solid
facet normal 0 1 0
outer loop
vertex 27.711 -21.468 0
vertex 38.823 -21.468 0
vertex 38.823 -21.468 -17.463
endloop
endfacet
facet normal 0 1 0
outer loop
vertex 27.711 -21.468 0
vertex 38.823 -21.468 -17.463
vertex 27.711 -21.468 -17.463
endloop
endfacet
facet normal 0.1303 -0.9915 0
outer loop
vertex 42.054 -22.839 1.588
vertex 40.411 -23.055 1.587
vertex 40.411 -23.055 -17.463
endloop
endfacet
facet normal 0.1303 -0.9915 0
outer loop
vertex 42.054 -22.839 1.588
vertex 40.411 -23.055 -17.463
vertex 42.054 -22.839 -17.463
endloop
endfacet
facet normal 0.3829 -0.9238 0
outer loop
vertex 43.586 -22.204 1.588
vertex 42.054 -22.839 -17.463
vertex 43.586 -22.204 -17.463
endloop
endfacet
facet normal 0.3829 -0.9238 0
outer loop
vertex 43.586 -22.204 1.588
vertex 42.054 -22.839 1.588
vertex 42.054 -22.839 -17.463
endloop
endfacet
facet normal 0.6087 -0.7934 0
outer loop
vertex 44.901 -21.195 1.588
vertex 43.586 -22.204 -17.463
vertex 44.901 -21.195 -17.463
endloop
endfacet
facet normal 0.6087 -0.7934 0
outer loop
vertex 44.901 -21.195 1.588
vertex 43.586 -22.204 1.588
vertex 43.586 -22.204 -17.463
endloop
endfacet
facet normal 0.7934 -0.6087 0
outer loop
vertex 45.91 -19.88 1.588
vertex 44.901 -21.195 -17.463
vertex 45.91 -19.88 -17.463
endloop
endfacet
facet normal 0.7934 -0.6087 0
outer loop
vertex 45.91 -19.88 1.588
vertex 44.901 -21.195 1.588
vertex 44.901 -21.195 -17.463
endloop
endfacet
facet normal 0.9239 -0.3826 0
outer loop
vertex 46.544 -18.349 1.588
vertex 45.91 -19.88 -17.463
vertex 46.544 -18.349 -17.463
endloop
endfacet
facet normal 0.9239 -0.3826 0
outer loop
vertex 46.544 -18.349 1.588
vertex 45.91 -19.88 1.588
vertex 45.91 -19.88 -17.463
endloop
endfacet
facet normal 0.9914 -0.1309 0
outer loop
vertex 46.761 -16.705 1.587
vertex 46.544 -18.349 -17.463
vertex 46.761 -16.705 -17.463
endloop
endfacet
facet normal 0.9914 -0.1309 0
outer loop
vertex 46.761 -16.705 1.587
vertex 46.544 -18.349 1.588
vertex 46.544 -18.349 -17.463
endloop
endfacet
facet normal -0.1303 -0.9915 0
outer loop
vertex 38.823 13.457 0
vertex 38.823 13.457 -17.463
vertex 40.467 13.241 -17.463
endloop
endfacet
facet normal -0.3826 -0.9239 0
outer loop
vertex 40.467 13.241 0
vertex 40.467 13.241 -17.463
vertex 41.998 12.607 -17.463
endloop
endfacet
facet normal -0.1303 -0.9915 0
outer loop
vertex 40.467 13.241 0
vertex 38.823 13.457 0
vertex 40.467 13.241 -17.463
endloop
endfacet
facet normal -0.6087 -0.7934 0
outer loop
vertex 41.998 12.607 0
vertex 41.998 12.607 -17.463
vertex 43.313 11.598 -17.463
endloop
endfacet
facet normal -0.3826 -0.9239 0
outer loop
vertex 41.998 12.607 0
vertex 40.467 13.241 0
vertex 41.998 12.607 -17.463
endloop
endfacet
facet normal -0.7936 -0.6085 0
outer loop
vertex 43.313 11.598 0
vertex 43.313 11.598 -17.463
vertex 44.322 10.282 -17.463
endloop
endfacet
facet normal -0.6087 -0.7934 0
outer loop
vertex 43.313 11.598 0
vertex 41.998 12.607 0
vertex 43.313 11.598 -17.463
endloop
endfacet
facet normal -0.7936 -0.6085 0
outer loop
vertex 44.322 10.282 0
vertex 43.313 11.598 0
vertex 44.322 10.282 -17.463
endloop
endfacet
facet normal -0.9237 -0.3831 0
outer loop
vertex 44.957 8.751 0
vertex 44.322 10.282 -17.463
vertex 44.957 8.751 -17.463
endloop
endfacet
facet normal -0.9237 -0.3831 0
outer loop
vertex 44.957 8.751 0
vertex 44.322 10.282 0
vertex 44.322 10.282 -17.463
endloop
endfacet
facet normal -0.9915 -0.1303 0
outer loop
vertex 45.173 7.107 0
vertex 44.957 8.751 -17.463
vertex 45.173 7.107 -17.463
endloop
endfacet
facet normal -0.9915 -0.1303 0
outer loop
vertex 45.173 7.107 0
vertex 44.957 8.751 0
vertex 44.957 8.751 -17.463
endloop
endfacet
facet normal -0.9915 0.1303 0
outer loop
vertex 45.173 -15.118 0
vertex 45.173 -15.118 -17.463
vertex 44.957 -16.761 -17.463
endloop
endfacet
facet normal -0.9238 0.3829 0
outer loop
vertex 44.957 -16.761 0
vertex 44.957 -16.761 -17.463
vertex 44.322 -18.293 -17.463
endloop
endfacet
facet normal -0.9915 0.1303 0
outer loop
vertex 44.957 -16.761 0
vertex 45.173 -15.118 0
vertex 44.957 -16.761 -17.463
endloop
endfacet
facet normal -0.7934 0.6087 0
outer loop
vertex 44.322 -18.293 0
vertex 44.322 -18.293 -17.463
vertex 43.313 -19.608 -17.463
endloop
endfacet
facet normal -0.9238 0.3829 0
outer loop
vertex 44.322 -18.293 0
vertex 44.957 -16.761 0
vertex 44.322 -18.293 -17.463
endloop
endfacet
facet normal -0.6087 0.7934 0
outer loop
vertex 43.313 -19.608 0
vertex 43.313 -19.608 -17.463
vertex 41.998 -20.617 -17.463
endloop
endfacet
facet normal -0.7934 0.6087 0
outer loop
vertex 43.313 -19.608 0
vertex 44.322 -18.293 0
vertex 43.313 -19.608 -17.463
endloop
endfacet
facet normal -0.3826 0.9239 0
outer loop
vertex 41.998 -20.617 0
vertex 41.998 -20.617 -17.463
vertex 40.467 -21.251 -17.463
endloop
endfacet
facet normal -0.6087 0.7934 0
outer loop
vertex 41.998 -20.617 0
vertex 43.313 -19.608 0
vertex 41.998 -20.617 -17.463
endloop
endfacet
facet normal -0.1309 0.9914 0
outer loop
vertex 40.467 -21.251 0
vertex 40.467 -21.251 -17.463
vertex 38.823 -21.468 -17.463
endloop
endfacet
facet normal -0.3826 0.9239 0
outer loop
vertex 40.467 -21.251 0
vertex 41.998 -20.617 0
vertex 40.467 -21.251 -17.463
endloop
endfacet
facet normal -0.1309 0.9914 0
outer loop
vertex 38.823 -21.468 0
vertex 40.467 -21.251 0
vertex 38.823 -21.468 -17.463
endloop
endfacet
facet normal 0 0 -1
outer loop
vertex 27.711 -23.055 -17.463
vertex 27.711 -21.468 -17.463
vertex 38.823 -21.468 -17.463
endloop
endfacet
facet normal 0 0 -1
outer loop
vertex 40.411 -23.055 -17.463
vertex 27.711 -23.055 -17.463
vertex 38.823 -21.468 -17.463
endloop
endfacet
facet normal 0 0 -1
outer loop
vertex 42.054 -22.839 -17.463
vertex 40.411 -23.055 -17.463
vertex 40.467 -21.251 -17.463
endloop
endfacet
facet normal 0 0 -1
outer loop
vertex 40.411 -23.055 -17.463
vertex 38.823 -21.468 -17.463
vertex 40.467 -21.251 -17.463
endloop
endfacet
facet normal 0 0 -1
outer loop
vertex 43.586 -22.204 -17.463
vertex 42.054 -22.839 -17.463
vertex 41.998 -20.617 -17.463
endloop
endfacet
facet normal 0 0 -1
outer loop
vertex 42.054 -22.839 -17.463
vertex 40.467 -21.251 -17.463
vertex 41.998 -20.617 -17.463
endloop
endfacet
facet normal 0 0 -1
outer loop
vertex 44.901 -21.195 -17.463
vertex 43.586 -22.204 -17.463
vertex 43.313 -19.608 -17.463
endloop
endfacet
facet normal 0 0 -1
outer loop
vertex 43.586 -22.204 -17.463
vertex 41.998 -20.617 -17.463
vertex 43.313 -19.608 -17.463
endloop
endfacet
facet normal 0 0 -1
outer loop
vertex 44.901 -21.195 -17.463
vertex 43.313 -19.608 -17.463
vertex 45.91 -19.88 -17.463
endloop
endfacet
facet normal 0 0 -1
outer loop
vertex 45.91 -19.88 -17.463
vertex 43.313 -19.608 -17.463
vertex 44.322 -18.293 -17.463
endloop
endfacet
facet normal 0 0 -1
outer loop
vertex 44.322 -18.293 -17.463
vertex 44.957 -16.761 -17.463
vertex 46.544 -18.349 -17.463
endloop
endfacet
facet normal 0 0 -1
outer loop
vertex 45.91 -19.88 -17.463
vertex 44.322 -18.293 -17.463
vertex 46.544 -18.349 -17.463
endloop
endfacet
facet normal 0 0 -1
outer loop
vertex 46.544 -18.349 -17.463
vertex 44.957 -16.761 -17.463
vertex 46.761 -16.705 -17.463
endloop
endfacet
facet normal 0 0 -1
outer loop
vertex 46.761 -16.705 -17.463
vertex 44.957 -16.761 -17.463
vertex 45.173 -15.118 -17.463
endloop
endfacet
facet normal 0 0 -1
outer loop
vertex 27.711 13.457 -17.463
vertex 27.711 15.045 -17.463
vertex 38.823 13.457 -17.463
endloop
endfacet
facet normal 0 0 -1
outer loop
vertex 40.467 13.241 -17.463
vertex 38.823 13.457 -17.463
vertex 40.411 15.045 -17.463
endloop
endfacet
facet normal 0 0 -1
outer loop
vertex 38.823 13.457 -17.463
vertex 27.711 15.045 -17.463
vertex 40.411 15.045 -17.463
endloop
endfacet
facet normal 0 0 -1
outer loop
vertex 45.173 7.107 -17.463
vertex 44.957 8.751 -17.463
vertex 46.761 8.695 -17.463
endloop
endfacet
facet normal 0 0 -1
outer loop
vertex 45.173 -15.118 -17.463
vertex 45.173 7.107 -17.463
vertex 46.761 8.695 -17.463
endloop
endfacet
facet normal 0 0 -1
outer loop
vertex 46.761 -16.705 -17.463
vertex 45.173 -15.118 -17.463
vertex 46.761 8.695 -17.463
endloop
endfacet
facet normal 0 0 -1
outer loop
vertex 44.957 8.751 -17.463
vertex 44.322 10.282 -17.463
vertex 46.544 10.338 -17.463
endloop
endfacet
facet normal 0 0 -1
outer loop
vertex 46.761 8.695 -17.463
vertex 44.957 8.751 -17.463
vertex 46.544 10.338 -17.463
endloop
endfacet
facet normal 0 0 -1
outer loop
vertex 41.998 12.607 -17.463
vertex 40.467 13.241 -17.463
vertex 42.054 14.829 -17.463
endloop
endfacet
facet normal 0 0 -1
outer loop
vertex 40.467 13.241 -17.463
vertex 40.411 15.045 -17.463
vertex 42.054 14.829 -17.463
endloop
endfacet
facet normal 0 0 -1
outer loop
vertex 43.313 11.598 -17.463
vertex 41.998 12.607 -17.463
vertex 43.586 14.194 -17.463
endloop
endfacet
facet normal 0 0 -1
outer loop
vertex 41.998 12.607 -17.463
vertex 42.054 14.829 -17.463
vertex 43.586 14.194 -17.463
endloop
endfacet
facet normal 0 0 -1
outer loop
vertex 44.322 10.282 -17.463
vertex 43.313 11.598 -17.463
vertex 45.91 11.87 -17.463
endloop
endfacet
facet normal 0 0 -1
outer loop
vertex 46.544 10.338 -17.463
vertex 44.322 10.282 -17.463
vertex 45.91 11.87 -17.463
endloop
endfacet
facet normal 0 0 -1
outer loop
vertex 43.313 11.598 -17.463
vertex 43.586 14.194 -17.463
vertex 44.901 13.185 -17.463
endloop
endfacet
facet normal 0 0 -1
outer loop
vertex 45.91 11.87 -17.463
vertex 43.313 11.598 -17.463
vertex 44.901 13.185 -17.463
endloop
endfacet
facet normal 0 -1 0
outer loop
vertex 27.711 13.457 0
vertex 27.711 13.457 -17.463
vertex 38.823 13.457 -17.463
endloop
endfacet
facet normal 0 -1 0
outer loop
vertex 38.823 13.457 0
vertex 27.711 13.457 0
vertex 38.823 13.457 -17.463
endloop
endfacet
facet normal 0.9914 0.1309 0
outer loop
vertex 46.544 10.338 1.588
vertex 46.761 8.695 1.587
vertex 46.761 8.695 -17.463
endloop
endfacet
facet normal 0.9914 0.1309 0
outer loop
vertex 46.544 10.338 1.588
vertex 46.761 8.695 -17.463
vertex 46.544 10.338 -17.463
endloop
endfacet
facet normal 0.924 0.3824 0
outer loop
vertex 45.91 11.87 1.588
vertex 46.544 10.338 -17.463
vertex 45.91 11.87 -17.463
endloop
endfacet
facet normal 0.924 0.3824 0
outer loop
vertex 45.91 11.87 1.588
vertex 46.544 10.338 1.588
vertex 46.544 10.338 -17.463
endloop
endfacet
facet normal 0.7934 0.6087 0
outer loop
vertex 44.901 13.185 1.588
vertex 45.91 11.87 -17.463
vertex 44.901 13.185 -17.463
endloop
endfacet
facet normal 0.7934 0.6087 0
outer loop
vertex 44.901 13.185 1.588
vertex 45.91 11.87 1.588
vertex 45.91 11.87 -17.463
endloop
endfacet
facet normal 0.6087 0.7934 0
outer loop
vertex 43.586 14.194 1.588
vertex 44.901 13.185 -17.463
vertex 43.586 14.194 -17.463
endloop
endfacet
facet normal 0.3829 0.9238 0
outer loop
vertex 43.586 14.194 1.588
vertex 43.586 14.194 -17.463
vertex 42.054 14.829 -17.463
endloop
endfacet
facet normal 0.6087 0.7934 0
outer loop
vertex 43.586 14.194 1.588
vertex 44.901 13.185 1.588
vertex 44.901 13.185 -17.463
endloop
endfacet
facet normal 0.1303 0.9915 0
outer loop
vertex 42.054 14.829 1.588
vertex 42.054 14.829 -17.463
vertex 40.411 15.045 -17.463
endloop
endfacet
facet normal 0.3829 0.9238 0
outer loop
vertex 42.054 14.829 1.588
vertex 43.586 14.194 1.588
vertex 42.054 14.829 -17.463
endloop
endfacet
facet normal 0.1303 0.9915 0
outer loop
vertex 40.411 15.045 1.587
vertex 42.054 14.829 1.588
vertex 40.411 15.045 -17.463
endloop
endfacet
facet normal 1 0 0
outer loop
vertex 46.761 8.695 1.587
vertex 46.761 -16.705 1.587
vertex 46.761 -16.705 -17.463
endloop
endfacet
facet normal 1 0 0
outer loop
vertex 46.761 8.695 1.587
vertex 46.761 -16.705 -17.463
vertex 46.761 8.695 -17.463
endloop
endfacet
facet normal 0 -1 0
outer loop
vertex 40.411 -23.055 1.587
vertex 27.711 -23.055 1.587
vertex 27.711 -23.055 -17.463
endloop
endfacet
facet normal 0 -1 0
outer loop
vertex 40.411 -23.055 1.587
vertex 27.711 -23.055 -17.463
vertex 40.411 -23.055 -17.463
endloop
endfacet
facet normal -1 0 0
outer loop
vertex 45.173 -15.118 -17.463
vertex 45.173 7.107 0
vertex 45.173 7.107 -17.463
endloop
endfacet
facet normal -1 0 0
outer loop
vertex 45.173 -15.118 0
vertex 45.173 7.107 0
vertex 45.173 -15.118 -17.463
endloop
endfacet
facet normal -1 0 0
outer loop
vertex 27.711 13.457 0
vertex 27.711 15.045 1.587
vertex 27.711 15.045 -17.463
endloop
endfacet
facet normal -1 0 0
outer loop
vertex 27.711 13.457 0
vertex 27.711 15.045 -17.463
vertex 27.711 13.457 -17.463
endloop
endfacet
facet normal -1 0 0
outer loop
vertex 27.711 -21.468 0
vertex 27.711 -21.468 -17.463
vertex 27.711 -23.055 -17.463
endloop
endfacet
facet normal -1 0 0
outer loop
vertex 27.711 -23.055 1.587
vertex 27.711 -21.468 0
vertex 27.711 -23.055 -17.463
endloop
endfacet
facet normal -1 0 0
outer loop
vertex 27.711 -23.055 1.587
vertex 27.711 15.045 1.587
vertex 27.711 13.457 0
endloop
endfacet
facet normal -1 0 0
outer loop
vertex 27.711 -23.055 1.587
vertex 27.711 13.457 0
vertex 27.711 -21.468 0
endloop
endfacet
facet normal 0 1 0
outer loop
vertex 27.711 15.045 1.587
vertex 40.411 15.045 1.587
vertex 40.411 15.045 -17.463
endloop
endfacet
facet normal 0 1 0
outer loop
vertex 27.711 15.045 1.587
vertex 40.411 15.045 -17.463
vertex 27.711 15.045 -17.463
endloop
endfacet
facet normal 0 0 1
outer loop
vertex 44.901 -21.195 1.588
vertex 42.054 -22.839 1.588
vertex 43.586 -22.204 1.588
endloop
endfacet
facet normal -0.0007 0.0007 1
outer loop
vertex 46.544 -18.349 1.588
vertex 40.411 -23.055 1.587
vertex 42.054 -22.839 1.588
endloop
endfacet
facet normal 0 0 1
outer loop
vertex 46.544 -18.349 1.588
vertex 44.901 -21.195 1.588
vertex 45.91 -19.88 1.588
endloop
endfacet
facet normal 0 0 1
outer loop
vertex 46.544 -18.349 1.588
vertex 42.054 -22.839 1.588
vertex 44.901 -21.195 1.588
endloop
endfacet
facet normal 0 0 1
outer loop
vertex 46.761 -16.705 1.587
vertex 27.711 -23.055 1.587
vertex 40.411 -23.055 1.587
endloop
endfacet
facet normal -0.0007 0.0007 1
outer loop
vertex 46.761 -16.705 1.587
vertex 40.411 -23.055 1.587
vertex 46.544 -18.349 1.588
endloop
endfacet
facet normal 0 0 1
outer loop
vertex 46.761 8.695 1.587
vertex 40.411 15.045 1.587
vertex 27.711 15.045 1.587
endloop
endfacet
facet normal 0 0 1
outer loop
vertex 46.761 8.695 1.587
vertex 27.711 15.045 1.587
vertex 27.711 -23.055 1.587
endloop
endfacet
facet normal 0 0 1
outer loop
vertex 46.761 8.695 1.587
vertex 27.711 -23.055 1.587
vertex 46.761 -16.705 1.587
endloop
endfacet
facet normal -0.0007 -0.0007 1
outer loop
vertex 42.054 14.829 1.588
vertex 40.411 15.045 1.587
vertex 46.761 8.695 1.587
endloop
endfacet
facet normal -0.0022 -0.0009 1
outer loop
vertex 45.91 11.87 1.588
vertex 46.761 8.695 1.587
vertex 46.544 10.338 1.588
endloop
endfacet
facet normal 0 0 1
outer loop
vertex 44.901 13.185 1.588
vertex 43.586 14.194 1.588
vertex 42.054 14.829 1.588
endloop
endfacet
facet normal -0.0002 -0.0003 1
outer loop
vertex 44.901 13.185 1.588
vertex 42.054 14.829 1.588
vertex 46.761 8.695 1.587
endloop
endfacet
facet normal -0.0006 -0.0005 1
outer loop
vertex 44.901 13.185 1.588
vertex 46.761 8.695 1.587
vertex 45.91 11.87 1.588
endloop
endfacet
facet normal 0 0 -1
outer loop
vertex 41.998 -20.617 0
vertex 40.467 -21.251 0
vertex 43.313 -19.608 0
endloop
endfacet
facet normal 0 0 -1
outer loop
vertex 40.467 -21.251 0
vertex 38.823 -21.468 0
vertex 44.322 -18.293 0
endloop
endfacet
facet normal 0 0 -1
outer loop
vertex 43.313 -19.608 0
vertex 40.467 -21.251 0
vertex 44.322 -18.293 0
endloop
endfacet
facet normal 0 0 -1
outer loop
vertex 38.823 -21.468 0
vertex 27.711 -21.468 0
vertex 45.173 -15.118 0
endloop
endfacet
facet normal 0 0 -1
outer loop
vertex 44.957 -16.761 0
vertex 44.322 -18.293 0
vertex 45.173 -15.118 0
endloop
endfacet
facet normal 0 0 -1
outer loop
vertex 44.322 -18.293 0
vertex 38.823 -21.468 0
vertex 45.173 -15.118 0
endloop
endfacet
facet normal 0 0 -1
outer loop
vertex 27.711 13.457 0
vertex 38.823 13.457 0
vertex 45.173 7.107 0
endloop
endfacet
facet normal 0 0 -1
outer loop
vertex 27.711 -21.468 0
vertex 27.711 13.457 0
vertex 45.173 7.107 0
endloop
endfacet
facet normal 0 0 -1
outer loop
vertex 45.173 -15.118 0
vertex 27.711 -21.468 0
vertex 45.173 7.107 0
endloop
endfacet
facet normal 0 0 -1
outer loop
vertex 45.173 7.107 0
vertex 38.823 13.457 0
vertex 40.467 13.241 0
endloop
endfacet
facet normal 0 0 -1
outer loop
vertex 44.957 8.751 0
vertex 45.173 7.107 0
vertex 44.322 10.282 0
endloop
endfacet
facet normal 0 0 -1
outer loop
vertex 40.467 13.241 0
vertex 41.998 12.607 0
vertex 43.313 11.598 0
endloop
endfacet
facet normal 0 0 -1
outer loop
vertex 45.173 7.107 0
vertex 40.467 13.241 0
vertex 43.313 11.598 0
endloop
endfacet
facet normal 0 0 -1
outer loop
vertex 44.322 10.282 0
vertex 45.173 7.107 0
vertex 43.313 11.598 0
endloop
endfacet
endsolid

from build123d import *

# Parameters (mm, degrees)
F1_DEPTH = 1.5875
F3_DEPTH = 19.05


with BuildPart() as f1:
    # F0 (on Top) → F1 (new body)
    with BuildSketch(Plane.XY):
        with BuildLine():
            Line((40.410568, 15.044903), (27.710568, 15.044903))
            Line((27.710568, 15.044903), (27.710568, -23.055097))
            Line((27.710568, -23.055097), (40.410568, -23.055097))
            ThreePointArc((40.410568, -23.055097), (44.900696, -21.195225), (46.760568, -16.705097))
            Line((46.760568, -16.705097), (46.760568, 8.694903))
            ThreePointArc((46.760568, 8.694903), (44.900696, 13.185031), (40.410568, 15.044903))
        make_face()
    extrude(amount=F1_DEPTH)

    # F2 (on face) → F3 (join)
    with BuildSketch(Plane.XY.offset(1.5875)):
        with BuildLine():
            Line((27.710568, 15.044903), (27.710568, 13.457403))
            Line((27.710568, 13.457403), (38.823068, 13.457403))
            ThreePointArc((38.823068, 13.457403), (43.313196, 11.597531), (45.173068, 7.107403))
            Line((45.173068, 7.107403), (45.173068, -15.117597))
            ThreePointArc((45.173068, -15.117597), (43.313196, -19.607725), (38.823068, -21.467597))
            Line((38.823068, -21.467597), (27.710568, -21.467597))
            Line((27.710568, -21.467597), (27.710568, -23.055097))
            Line((27.710568, -23.055097), (40.410568, -23.055097))
            ThreePointArc((40.410568, -23.055097), (44.900696, -21.195225), (46.760568, -16.705097))
            Line((46.760568, -16.705097), (46.760568, 8.694903))
            ThreePointArc((46.760568, 8.694903), (44.900696, 13.185031), (40.410568, 15.044903))
            Line((40.410568, 15.044903), (27.710568, 15.044903))
        make_face()
    extrude(amount=-F3_DEPTH)


solid = f1.part
